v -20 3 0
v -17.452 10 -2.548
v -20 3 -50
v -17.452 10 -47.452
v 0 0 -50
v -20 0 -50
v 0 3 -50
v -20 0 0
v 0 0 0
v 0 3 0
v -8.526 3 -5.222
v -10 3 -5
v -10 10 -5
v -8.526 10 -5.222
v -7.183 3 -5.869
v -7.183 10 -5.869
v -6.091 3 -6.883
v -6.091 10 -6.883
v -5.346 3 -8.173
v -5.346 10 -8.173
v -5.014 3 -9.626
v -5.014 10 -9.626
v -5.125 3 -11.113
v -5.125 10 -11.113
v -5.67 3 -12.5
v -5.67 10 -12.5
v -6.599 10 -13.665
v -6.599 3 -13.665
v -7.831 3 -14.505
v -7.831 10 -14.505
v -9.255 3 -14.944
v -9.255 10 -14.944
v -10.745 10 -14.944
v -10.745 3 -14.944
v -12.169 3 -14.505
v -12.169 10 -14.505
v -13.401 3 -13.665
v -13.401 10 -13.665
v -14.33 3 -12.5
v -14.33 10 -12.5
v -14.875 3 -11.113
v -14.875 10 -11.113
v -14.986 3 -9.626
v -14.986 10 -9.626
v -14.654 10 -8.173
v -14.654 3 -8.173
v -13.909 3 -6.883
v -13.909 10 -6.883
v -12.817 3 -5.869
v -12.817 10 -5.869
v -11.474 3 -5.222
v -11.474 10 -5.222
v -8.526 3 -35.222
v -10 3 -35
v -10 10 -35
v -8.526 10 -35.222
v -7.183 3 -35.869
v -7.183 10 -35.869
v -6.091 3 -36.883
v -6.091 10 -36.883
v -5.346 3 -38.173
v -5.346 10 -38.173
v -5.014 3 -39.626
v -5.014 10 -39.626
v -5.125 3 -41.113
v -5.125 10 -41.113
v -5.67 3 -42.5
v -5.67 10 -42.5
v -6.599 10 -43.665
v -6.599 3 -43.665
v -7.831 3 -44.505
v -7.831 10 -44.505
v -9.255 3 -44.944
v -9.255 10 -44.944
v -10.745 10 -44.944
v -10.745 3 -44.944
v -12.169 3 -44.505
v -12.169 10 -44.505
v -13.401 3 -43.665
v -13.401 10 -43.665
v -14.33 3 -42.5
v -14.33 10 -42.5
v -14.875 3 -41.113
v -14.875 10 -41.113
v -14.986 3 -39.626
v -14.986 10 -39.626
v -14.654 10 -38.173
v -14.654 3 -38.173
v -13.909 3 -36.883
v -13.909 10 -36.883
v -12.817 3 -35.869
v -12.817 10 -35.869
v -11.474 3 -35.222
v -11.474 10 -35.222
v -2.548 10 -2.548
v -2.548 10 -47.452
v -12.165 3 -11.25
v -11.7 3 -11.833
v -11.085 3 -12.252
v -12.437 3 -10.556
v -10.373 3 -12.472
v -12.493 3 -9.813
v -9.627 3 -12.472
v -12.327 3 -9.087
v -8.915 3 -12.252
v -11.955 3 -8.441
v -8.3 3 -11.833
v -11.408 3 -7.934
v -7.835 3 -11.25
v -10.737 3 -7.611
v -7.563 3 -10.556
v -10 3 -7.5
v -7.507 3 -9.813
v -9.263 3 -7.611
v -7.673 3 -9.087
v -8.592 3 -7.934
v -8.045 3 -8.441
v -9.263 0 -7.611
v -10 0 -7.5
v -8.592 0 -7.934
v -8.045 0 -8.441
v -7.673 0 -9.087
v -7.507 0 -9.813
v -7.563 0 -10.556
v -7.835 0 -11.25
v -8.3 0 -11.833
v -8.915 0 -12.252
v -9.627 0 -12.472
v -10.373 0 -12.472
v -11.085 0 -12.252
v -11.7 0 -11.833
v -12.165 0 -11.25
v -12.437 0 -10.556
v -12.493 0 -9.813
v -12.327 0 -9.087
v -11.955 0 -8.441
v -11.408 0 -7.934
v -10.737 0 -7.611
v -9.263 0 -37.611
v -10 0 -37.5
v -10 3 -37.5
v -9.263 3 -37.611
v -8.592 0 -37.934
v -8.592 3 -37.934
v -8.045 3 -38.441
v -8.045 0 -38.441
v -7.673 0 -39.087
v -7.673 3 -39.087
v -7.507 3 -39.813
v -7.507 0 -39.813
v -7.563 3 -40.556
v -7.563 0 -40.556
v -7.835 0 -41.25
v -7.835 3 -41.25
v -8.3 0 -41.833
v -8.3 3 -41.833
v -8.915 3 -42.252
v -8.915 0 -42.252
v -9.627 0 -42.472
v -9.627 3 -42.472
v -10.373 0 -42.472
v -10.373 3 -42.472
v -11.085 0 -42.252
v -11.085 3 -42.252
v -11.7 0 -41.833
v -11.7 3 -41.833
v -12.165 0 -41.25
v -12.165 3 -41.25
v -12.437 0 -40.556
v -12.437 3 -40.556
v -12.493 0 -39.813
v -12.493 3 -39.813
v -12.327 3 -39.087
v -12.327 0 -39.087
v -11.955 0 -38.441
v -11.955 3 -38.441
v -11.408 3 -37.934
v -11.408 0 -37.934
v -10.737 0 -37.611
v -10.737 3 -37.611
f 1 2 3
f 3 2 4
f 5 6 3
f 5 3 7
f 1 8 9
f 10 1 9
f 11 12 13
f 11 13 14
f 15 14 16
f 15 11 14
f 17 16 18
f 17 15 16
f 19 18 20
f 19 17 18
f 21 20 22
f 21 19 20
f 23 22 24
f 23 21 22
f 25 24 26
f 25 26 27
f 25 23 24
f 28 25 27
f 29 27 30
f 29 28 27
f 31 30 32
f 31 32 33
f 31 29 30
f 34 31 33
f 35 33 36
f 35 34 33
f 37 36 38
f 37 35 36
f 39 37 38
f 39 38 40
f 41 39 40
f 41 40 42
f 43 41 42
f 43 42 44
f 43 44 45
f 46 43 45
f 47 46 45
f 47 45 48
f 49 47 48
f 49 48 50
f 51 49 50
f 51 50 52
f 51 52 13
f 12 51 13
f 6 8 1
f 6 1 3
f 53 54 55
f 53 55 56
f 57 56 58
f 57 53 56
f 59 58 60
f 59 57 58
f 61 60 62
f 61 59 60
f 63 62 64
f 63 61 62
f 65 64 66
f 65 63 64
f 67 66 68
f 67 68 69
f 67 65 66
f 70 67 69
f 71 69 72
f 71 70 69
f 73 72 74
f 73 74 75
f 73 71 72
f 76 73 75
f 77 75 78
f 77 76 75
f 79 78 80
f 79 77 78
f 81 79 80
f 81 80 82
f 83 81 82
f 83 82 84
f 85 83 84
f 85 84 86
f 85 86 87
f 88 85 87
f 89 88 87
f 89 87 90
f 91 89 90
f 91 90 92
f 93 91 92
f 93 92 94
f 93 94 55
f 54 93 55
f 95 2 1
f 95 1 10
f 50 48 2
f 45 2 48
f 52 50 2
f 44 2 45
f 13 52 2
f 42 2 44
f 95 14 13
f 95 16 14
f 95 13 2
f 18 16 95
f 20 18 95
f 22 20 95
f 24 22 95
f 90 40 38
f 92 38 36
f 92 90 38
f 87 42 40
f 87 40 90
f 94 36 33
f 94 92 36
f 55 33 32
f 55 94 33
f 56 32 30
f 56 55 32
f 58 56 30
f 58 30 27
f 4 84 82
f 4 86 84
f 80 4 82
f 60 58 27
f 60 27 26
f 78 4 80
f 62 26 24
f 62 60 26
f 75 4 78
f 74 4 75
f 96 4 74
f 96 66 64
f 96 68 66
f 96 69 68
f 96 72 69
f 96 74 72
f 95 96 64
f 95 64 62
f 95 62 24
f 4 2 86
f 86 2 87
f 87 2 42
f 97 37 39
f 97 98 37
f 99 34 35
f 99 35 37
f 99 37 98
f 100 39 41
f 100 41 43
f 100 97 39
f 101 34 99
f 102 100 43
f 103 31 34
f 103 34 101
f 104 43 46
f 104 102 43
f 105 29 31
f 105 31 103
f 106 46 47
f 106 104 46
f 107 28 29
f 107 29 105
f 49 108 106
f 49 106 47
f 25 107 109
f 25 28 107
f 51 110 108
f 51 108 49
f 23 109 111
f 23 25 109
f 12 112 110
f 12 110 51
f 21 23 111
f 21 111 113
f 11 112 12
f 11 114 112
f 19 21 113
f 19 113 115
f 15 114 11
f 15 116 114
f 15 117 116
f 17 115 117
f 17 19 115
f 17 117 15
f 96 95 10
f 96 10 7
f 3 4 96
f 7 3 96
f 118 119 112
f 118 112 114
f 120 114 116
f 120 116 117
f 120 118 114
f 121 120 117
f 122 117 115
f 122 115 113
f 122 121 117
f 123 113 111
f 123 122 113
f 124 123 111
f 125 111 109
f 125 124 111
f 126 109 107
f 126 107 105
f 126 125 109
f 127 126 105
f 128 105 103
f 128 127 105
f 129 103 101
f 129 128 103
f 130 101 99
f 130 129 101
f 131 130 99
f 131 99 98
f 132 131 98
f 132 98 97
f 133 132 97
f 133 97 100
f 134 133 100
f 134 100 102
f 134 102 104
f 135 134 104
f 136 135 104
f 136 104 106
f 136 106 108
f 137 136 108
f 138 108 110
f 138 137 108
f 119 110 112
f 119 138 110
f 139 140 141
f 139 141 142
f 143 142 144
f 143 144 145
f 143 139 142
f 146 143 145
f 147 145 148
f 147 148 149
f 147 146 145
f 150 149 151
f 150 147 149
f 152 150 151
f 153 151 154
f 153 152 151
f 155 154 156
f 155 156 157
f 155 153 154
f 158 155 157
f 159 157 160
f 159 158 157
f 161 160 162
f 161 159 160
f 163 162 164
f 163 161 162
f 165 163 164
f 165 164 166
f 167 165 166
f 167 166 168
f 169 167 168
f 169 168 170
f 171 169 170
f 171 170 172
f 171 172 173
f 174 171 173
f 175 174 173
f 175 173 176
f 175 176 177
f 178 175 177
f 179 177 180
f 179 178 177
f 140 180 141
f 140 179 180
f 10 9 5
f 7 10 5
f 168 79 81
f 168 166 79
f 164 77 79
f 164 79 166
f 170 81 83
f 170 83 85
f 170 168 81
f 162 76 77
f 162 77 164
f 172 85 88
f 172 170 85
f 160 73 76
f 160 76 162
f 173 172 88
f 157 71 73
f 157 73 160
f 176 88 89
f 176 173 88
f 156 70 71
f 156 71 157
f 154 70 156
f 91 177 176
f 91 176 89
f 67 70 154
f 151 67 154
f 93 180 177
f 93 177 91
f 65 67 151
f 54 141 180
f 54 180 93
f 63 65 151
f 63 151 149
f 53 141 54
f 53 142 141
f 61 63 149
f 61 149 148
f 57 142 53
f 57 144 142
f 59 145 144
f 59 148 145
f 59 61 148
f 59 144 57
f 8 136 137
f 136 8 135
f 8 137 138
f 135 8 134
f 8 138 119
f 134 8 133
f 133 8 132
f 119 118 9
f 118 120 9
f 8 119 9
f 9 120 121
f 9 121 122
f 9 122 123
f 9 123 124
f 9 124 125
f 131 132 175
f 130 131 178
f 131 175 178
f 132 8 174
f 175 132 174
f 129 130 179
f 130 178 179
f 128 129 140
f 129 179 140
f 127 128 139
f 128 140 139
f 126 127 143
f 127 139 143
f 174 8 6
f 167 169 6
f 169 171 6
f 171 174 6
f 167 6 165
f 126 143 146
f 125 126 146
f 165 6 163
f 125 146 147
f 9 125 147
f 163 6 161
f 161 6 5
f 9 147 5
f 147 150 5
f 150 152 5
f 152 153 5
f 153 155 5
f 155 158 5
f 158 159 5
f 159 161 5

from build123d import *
from OCP.BRepFilletAPI import BRepFilletAPI_MakeChamfer

# Parameters (mm, degrees)
SKETCH1_R             = 5
SKETCH1_R_2           = 2.5
BOSS_EXTRUDE1_DEPTH   = 3
BOSS_EXTRUDE1_2_DEPTH = 3
SKETCH1_3_W           = 20
SKETCH1_3_H           = 50
SKETCH1_3_R           = 5
BOSS_EXTRUDE2_DEPTH   = 10
CHAMFER1_SIZE         = 7
CHAMFER1_SIZE2        = 2.54779164


with BuildPart() as part:
    # Sketch1 → Boss-Extrude1 (new body)
    with BuildSketch(Plane(origin=(0, 0, 0), x_dir=(1, 0, 0), z_dir=(0, 1, 0))):
        with Locations((-10, 40)):
            Circle(SKETCH1_R)
        with Locations((-10, 40)):
            Circle(SKETCH1_R_2, mode=Mode.SUBTRACT)
    extrude(amount=BOSS_EXTRUDE1_DEPTH)



with BuildPart() as body_2:
    # Sketch1 → Boss-Extrude1 2 (new body)
    with BuildSketch(Plane(origin=(0, 0, 0), x_dir=(1, 0, 0), z_dir=(0, 1, 0))):
        with Locations((-10, 10)):
            Circle(SKETCH1_R)
        with Locations((-10, 10)):
            Circle(SKETCH1_R_2, mode=Mode.SUBTRACT)
    extrude(amount=BOSS_EXTRUDE1_2_DEPTH)


with BuildPart() as part_1:
    add(part.part)

    add(body_2.part)  # Boss-Extrude2 merges body 2
    # Sketch1<3> → Boss-Extrude2 (add)
    with BuildSketch(Plane(origin=(0, 0, 0), x_dir=(1, 0, 0), z_dir=(0, 1, 0))):
        with Locations((-10, 25)):
            Rectangle(SKETCH1_3_W, SKETCH1_3_H)
        with Locations((-10, 10)):
            Circle(SKETCH1_3_R, mode=Mode.SUBTRACT)
        with Locations((-10, 40)):
            Circle(SKETCH1_3_R, mode=Mode.SUBTRACT)
    extrude(amount=BOSS_EXTRUDE2_DEPTH)

    # Chamfer1: one chamfer whose edges measure the first distance from different faces: ONE call of the kernel's chamfer builder (chamfer() names one face for all edges)
    chamfer1_edges_1 = [part_1.edges().sort_by_distance(p)[0] for p in [
        (-10, 10, -50),
    ]]
    chamfer1_side_1 = [part_1.faces().sort_by_distance(p)[0] for p in [
        (-10, 5, -50),
    ]]
    chamfer1_edges_2 = [part_1.edges().sort_by_distance(p)[0] for p in [
        (-20, 10, -25),
    ]]
    chamfer1_side_2 = [part_1.faces().sort_by_distance(p)[0] for p in [
        (-20, 5, -25),
    ]]
    chamfer1_edges_3 = [part_1.edges().sort_by_distance(p)[0] for p in [
        (-10, 10, 0),
    ]]
    chamfer1_side_3 = [part_1.faces().sort_by_distance(p)[0] for p in [
        (-10, 5, 0),
    ]]
    chamfer1_edges_4 = [part_1.edges().sort_by_distance(p)[0] for p in [
        (0, 10, -25),
    ]]
    chamfer1_side_4 = [part_1.faces().sort_by_distance(p)[0] for p in [
        (0, 5, -25),
    ]]
    chamfer1 = BRepFilletAPI_MakeChamfer(part_1.part.solid().wrapped)
    for e in chamfer1_edges_1:
        chamfer1.Add(CHAMFER1_SIZE, CHAMFER1_SIZE2, e.wrapped, chamfer1_side_1[0].wrapped)  # the first distance lies on this face
    for e in chamfer1_edges_2:
        chamfer1.Add(CHAMFER1_SIZE, CHAMFER1_SIZE2, e.wrapped, chamfer1_side_2[0].wrapped)  # the first distance lies on this face
    for e in chamfer1_edges_3:
        chamfer1.Add(CHAMFER1_SIZE, CHAMFER1_SIZE2, e.wrapped, chamfer1_side_3[0].wrapped)  # the first distance lies on this face
    for e in chamfer1_edges_4:
        chamfer1.Add(CHAMFER1_SIZE, CHAMFER1_SIZE2, e.wrapped, chamfer1_side_4[0].wrapped)  # the first distance lies on this face
    add(Compound.cast(chamfer1.Shape()), mode=Mode.REPLACE)


solid = part_1.part
